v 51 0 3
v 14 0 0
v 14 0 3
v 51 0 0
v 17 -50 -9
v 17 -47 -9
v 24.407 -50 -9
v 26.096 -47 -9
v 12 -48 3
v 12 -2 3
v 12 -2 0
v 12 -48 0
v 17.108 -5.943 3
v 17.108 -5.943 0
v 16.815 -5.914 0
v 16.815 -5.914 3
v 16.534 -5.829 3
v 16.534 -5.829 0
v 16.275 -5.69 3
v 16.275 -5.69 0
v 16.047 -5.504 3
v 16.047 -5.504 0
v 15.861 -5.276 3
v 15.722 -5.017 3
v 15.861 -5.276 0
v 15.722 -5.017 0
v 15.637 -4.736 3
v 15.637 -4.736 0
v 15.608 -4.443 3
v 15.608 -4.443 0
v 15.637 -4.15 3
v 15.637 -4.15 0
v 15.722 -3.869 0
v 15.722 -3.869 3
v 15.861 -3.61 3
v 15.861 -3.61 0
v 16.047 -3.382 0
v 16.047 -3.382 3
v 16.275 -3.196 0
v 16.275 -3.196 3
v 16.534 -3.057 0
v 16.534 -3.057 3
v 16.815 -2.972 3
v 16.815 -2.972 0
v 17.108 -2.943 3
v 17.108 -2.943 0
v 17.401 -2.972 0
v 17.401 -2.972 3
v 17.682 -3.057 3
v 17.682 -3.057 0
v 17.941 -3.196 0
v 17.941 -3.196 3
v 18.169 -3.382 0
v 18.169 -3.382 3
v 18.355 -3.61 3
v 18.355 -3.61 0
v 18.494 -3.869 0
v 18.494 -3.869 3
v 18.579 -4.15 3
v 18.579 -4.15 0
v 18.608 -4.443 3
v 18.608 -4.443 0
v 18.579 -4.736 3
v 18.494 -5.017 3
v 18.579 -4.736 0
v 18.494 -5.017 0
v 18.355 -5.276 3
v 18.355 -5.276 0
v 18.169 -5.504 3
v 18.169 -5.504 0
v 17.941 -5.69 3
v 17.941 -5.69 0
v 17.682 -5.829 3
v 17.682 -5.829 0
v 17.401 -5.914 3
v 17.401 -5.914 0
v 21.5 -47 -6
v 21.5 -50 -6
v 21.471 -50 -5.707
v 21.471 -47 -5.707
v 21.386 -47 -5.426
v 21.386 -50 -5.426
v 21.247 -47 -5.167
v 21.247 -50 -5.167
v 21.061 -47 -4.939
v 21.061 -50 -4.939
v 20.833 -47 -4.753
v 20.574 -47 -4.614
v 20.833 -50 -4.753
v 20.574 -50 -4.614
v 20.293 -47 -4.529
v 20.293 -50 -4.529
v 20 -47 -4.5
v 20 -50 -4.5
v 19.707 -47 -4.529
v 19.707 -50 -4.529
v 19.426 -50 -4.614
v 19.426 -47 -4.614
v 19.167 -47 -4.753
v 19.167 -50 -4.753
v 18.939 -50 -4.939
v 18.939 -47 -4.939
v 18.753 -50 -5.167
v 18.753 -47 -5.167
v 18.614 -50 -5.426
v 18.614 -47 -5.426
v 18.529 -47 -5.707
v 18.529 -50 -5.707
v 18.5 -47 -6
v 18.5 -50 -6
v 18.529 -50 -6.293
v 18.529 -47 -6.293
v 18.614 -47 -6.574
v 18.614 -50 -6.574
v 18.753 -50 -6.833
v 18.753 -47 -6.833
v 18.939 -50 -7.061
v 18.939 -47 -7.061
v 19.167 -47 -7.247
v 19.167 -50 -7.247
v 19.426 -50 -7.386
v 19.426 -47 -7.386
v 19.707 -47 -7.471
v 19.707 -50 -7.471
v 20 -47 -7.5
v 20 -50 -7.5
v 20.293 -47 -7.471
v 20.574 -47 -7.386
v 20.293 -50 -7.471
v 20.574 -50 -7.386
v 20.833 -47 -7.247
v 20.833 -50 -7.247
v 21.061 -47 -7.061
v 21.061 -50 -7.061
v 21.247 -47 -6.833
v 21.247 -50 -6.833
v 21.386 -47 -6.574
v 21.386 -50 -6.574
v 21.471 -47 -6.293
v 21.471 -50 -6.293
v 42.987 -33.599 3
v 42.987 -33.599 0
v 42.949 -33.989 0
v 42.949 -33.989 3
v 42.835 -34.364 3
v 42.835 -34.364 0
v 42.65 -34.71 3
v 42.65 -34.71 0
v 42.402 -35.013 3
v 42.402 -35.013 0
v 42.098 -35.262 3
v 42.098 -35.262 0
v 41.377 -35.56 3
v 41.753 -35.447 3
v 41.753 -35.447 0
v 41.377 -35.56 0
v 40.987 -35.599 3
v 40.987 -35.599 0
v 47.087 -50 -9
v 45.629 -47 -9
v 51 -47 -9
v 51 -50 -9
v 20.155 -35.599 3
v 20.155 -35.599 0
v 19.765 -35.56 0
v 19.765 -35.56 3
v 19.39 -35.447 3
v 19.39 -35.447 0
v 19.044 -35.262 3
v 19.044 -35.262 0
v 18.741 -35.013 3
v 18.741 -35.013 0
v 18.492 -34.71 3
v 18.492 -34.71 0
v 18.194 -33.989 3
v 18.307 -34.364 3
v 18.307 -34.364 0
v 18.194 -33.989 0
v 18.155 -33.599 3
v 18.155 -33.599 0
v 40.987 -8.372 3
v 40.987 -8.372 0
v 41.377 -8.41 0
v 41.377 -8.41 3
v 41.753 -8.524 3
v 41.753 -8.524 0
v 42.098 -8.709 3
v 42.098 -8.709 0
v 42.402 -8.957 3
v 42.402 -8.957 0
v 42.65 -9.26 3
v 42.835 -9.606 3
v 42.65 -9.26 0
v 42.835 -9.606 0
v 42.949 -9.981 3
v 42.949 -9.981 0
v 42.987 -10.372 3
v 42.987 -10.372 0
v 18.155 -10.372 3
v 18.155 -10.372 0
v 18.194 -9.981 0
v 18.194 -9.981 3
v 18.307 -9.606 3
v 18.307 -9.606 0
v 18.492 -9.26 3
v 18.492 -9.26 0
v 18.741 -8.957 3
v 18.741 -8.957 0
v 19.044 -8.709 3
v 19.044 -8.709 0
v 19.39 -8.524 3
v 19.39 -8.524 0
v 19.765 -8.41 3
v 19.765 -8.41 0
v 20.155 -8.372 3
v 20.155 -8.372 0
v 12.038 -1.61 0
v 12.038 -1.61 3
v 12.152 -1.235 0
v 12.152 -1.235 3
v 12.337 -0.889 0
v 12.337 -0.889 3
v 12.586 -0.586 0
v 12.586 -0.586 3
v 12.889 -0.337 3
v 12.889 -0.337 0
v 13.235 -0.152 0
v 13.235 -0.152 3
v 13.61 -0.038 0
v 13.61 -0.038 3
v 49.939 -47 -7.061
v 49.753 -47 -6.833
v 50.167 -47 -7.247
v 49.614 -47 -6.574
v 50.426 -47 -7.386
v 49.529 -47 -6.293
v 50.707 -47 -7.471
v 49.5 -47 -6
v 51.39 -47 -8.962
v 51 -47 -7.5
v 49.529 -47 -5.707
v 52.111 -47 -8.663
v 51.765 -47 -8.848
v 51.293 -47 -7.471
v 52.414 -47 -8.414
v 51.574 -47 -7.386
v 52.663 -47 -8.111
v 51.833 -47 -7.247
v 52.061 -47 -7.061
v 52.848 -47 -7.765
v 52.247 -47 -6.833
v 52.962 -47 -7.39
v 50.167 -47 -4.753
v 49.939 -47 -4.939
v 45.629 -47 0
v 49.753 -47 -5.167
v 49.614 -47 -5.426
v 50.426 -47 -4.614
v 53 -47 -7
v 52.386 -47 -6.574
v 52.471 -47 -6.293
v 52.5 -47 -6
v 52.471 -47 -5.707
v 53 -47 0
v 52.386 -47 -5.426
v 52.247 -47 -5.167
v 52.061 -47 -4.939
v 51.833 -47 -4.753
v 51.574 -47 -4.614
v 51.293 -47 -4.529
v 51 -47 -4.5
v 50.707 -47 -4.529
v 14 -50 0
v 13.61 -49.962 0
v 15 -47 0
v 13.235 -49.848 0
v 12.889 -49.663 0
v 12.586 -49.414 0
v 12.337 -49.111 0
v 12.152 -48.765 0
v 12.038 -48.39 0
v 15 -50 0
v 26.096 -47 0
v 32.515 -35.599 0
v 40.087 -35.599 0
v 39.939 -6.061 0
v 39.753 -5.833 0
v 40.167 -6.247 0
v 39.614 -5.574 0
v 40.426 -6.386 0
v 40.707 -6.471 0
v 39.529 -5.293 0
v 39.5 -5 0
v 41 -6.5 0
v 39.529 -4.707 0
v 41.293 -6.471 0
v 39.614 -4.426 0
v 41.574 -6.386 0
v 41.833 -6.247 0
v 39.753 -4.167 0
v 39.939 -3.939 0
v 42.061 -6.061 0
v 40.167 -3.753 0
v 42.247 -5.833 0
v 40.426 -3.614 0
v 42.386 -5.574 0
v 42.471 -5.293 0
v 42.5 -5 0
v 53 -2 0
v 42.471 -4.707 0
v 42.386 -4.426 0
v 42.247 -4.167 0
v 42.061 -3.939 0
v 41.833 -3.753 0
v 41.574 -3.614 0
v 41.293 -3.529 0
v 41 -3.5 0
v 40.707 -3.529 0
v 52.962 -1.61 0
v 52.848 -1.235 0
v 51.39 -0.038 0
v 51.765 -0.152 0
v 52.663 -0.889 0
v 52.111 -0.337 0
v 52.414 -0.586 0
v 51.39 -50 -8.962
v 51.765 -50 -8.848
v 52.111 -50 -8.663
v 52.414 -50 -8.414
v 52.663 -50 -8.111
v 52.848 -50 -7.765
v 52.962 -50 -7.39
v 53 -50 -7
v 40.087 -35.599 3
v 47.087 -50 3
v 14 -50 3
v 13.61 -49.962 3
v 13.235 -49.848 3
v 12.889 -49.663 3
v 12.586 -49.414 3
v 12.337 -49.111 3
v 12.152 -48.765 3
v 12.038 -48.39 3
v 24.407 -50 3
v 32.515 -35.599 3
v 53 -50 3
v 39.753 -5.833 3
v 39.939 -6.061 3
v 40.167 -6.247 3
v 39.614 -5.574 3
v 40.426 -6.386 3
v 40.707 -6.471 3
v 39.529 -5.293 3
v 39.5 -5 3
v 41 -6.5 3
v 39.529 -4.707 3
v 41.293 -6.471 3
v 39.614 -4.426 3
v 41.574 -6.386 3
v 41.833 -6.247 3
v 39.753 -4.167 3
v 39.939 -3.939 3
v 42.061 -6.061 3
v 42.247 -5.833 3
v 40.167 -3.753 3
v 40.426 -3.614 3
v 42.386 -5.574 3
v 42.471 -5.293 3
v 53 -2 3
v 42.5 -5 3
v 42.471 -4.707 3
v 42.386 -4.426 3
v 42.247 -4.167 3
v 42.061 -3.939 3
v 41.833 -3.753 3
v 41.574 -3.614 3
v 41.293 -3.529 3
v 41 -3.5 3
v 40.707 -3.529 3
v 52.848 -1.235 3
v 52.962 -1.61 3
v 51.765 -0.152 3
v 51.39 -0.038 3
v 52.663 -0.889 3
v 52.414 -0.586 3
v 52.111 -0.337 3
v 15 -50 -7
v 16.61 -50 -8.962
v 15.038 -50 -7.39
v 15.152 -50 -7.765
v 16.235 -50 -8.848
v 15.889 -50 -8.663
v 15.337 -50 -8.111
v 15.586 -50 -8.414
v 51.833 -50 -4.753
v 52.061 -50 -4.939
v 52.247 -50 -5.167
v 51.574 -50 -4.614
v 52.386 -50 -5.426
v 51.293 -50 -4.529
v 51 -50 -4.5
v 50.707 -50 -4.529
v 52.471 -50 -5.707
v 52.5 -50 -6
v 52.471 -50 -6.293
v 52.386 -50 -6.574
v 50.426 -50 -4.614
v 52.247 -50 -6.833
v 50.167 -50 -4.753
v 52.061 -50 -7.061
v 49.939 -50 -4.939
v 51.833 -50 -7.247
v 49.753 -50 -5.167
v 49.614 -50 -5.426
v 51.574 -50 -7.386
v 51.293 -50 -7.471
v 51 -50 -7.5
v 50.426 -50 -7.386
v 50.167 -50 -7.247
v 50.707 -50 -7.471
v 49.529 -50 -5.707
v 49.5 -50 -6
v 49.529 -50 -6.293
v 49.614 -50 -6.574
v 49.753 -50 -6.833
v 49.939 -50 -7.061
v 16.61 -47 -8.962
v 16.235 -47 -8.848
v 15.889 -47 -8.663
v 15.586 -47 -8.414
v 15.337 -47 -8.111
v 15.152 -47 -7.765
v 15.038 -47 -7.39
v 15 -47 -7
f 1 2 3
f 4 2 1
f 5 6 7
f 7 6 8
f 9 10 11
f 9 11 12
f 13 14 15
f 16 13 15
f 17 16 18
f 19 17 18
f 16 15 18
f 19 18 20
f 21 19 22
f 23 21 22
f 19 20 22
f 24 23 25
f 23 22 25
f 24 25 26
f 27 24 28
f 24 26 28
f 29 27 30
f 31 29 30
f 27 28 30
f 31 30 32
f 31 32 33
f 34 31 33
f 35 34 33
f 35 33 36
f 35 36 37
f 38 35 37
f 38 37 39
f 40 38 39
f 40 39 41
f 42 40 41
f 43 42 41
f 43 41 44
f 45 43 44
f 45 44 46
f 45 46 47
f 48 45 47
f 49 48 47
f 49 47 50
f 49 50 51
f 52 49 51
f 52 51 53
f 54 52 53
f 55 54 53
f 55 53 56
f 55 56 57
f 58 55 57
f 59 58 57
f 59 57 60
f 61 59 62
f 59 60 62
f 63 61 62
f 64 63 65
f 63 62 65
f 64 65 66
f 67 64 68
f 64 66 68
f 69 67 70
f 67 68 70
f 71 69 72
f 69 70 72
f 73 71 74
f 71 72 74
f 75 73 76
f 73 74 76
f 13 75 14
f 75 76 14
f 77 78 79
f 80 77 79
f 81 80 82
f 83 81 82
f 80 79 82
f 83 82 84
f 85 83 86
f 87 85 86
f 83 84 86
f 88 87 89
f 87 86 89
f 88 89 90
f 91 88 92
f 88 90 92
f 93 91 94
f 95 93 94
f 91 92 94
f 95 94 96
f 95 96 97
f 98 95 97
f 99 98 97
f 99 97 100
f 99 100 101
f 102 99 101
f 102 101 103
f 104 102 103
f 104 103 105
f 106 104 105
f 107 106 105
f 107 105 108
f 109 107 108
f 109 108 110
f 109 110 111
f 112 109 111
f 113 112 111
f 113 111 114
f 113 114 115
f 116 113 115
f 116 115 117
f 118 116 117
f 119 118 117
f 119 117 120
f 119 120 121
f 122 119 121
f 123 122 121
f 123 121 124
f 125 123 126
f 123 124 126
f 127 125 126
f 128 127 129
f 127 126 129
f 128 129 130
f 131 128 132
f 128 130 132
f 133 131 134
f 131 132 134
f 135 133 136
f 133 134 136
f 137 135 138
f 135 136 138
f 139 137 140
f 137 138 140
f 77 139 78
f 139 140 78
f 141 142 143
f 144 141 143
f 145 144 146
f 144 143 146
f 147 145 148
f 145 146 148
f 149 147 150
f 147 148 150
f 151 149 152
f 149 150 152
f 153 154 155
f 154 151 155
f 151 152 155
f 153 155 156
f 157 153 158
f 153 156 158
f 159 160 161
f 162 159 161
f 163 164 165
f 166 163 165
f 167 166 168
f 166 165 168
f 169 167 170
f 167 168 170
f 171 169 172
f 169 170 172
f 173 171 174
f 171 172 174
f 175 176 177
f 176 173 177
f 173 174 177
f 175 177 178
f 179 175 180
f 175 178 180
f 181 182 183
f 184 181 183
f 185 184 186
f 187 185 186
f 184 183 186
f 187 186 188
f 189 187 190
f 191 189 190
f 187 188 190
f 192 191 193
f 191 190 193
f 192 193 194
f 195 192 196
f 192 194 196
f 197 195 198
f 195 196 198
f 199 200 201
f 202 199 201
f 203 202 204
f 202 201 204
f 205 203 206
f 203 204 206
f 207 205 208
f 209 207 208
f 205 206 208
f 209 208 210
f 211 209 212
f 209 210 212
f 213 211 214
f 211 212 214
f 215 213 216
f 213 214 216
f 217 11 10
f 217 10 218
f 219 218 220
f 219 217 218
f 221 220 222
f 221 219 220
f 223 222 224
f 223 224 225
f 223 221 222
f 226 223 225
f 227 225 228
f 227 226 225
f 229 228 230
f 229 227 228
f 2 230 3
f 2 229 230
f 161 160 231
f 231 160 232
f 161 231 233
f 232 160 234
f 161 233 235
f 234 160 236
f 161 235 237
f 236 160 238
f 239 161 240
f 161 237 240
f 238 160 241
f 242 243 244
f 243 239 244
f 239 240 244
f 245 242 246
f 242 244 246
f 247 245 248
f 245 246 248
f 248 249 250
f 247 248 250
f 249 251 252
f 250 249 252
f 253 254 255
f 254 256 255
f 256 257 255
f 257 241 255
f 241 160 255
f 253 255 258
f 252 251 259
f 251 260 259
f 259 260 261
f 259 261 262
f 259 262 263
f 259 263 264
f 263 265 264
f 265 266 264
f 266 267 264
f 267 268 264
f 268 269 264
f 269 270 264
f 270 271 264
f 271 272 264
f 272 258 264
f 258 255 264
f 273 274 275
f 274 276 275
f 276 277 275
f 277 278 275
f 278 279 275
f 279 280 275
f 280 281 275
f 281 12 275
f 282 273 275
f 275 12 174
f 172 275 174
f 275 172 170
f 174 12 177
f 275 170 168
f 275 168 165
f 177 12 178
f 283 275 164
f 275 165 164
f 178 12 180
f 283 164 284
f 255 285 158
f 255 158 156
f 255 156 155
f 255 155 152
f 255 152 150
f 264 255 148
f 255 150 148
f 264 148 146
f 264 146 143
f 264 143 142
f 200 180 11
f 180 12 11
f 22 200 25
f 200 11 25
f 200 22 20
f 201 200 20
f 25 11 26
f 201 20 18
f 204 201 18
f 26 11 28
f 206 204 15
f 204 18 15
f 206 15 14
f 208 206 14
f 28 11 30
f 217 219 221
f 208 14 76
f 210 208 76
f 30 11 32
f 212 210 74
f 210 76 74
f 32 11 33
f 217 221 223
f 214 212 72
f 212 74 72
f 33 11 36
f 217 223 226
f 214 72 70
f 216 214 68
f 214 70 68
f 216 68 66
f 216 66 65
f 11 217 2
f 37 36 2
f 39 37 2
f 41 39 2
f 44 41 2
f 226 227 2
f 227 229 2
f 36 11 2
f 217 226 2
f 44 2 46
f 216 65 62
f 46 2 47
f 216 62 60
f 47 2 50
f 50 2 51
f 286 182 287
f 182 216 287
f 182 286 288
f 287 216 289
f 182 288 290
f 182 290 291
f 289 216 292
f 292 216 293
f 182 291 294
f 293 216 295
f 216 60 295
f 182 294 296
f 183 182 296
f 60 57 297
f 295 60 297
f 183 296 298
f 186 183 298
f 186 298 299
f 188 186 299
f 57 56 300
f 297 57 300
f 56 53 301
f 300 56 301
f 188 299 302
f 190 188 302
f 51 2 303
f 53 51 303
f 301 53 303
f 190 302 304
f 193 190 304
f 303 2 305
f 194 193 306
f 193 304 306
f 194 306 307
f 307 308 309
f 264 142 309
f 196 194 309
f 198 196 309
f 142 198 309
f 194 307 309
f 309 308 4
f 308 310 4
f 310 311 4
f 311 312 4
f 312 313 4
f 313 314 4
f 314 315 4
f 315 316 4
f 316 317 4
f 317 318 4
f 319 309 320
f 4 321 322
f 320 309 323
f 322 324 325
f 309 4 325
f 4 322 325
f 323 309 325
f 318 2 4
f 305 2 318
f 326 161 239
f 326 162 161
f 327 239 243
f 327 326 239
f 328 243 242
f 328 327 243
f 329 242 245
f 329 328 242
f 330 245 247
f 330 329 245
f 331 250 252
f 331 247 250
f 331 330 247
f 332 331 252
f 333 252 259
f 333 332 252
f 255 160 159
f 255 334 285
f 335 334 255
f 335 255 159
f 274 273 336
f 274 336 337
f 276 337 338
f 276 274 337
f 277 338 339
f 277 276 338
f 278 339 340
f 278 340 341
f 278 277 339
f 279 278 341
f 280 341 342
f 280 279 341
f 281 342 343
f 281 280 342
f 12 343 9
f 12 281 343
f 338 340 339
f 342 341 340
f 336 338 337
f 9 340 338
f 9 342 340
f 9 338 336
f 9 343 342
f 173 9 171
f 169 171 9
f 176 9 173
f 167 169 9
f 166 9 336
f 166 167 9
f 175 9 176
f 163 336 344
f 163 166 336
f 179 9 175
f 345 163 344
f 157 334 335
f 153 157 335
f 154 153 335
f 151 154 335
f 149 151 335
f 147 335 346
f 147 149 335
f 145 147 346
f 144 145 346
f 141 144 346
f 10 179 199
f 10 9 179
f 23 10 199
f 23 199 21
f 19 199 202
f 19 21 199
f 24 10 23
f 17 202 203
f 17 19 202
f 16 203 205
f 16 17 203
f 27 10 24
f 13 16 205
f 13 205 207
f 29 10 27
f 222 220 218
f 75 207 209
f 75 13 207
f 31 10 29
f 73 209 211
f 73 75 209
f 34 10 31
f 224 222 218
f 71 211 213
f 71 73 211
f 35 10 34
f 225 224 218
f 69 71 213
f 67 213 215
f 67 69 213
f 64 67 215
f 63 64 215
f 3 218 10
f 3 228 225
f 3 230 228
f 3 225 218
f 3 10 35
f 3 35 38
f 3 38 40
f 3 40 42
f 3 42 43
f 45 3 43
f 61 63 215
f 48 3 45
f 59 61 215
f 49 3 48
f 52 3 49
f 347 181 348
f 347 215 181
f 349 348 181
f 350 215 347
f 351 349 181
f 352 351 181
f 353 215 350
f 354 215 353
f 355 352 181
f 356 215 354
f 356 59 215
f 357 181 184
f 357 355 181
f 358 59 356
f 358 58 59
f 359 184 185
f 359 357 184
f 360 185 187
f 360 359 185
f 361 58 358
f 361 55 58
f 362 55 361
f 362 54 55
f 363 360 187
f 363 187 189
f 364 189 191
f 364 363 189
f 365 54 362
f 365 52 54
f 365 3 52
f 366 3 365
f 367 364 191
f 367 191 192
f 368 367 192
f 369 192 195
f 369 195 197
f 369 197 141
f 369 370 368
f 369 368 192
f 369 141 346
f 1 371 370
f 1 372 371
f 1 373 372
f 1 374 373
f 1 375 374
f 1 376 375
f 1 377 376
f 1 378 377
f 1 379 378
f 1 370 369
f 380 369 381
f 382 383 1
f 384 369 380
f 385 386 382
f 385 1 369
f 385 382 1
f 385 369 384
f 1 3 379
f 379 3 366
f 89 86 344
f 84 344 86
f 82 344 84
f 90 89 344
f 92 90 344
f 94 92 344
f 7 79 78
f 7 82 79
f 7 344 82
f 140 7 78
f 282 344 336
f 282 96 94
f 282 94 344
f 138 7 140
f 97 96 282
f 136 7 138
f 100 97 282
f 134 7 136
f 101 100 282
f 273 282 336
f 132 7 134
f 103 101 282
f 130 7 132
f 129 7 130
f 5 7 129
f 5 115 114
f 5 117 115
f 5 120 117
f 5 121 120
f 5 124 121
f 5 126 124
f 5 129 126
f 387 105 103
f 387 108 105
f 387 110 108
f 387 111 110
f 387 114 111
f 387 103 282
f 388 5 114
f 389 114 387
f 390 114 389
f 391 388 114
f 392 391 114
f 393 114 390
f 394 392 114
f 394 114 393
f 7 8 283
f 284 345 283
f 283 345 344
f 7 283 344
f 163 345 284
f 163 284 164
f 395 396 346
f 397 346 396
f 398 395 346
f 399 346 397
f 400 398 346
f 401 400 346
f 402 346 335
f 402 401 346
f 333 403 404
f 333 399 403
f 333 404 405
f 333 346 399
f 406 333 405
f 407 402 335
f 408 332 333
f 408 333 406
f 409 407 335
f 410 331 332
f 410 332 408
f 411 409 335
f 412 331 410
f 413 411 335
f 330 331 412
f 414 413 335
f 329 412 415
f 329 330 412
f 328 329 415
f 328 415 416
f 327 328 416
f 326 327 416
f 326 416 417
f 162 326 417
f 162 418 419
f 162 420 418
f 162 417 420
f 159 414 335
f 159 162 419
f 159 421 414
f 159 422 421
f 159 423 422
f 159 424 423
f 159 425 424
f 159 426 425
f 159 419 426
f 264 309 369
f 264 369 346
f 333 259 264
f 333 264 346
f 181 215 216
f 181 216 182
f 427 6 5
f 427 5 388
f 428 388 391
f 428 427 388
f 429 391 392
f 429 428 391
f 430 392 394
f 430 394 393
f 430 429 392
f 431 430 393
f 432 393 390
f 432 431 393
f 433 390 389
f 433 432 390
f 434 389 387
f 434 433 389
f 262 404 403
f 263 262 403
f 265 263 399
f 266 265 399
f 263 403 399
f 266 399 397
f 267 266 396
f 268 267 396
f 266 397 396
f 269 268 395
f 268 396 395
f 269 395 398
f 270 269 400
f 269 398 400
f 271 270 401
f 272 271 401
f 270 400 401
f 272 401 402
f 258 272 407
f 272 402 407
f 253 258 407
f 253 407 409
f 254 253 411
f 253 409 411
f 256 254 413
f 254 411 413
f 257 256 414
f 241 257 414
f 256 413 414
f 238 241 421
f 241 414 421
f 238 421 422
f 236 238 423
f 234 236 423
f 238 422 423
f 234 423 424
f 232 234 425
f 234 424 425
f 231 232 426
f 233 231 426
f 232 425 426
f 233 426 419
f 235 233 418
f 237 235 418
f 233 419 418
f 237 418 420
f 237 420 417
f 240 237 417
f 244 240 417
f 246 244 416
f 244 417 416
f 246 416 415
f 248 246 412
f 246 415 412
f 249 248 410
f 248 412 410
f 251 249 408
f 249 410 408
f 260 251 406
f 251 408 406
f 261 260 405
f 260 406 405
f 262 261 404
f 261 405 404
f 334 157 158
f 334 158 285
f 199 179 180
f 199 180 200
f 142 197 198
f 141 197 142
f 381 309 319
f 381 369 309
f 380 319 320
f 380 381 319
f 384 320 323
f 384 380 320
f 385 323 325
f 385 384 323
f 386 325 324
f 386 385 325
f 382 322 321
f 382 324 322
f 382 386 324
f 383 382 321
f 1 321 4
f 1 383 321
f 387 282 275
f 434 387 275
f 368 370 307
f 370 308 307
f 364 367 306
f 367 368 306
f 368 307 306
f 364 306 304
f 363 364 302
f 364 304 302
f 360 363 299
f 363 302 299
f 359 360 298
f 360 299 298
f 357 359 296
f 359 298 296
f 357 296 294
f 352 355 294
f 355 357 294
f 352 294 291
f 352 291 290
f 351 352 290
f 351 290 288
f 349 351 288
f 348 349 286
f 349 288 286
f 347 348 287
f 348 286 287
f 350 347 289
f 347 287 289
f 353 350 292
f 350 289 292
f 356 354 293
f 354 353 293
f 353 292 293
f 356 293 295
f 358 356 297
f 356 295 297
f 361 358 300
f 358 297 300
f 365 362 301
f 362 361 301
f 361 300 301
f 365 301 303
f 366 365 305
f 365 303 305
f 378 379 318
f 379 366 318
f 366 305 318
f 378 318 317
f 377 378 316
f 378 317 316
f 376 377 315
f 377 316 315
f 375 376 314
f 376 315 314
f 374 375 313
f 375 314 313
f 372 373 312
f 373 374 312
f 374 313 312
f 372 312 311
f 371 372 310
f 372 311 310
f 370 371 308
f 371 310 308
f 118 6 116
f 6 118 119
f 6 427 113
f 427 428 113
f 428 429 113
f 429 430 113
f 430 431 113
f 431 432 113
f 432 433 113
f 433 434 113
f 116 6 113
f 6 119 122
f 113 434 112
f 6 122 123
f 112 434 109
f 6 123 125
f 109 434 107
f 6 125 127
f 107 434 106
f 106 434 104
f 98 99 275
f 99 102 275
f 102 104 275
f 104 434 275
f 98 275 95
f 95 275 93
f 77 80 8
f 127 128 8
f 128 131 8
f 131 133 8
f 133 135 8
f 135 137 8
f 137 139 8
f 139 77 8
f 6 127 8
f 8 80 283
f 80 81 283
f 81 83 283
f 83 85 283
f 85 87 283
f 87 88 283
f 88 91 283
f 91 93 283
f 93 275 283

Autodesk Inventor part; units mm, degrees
ref_plane "YZ Plane" through (0, 0, 0) normal (1, 0, 0) x (0, 1, 0)
ref_plane "XZ Plane" through (0, 0, 0) normal (0, 1, 0) x (-1, 0, 0)
ref_plane "XY Plane" through (0, 0, 0) normal (0, 0, 1) x (1, 0, 0)
sketch "Sketch1" plane through (0, 0, 0) normal (0, 0, 1) x (1, 0, 0)
  line L0 (0, 0) -> (53, 0)
  line L1 (53, 0) -> (53, -50)
  line L2 (53, -50) -> (0, -50)
  line L3 (0, -50) -> (0, 0)
  line L4 (41, 0) -> (41, 6.0159) construction
  line L5 (41, 6.0159) -> (41, -25.0024) construction
  circle A0 centre (41, -5) radius 1.5
  line L6 (41, 3.3654) -> (9, 3.3654) construction
  line L7 (9, 3.3654) -> (9, -23.8563) construction
  line L8 (41, -5) -> (7.1054, -5) construction
  circle A1 centre (9, -5) radius 1.5
  dimension "d0" = 53
  dimension "d1" = 50
  dimension "d2" = 3
  dimension "d3" = 32
  dimension "d4" = 3
extrude "Extrusion1" add sketch "Sketch1" along normal blind 3
sketch "Sketch2" plane through (0, 0, 3) normal (0, 0, 1) x (1, 0, 0)
  line L0 (53, -50) -> (15, -50)
  line L1 (15, -50) -> (15, -47)
  line L2 (15, -47) -> (53, -47)
  line L3 (53, -47) -> (53, -50)
  dimension "d7" = 38
  dimension "d8" = 3
extrude "Extrusion2" add sketch "Sketch2" against normal blind 12
fillet "Fillet3" radius 2 1 edges at (53, -48.5, -9)
fillet "Fillet6" radius 2 1 edges at (15, -48.5, -9)
sketch "Sketch5" plane through (0, 0, 3) normal (0, 0, 1) x (1, 0, 0)
  line L0 (18.1552, -8.3715) -> (42.9873, -8.3715)
  line L1 (42.9873, -8.3715) -> (42.9873, -35.5989)
  line L2 (42.9873, -35.5989) -> (18.1552, -35.5989)
  line L3 (18.1552, -35.5989) -> (18.1552, -8.3715)
extrude "Extrusion4" cut sketch "Sketch5" against normal through all
fillet "Fillet8" radius 2 1 edges at (18.1552, -8.3715, 1.5)
fillet "Fillet9" radius 2 1 edges at (42.9873, -8.3715, 1.5)
fillet "Fillet10" radius 2 1 edges at (18.1552, -35.5989, 1.5)
fillet "Fillet12" radius 2 1 edges at (42.9873, -35.5989, 1.5)
fillet "Fillet13" radius 2 1 edges at (0, 0, 1.5)
fillet "Fillet14" radius 2 1 edges at (53, 0, 1.5)
hole "Hole3" at (17.1081, -4.4429, 3) direction (0, 0, -1) diameter 3 end through all
sketch "Sketch6" plane through (0, -50, 3) normal (0, -1, 0) x (1, 0, 0)
  line L0 (51, -12) -> (17, -12) projected
  line L1 (0, 0) -> (53, 0) projected
  line L2 (53, 0) -> (51, 0) construction
  line L3 (51, 2) -> (51, -15) construction
  line L4 (54, -9) -> (12.4146, -9) construction
  line L5 (51, -7.4819) -> (20, -7.4819) construction
  line L6 (20, -7.4819) -> (20, -11) construction
  circle A0 centre (20, -9) radius 1.5
  circle A1 centre (51, -9) radius 1.5
  dimension "d60" = 31
  dimension "d61" = 3
  dimension "d64" = 3
extrude "Extrusion5" cut sketch "Sketch6" against normal through all contours A0
extrude "Extrusion6" cut sketch "Sketch6" against normal through all contours A1
sketch "Sketch7" plane through (0, 0, 3) normal (0, 0, 1) x (1, 0, 0)
  line L0 (40.9873, -35.5989) -> (20.1552, -35.5989) projected
  line L1 (0, -50) -> (53, -50) projected
  line L2 (32.5151, -35.5989) -> (24.407, -50)
  line L3 (40.0869, -35.5989) -> (47.0869, -50)
  point P0 (0, 0)
extrude "Extrusion7" cut sketch "Sketch7" against normal through all
sketch "Sketch8" plane through (0, 0, 3) normal (0, 0, 1) x (1, 0, 0)
  line L0 (0, -50) -> (24.407, -50) projected
  circle A0 centre (9, -5) radius 1.5 projected
  line L1 (0, 0) -> (12, 0)
  line L2 (12, 0) -> (12, -50)
  line L3 (12, -50) -> (0, -50)
  line L4 (0, -50) -> (0, 0)
extrude "Extrusion8" cut sketch "Sketch8" against normal through all
fillet "Fillet15" radius 2 1 edges at (12, -50, 1.5)
fillet "Fillet16" radius 2 1 edges at (12, 0, 1.5)
properties part number "bart z endstop bracket v3"
